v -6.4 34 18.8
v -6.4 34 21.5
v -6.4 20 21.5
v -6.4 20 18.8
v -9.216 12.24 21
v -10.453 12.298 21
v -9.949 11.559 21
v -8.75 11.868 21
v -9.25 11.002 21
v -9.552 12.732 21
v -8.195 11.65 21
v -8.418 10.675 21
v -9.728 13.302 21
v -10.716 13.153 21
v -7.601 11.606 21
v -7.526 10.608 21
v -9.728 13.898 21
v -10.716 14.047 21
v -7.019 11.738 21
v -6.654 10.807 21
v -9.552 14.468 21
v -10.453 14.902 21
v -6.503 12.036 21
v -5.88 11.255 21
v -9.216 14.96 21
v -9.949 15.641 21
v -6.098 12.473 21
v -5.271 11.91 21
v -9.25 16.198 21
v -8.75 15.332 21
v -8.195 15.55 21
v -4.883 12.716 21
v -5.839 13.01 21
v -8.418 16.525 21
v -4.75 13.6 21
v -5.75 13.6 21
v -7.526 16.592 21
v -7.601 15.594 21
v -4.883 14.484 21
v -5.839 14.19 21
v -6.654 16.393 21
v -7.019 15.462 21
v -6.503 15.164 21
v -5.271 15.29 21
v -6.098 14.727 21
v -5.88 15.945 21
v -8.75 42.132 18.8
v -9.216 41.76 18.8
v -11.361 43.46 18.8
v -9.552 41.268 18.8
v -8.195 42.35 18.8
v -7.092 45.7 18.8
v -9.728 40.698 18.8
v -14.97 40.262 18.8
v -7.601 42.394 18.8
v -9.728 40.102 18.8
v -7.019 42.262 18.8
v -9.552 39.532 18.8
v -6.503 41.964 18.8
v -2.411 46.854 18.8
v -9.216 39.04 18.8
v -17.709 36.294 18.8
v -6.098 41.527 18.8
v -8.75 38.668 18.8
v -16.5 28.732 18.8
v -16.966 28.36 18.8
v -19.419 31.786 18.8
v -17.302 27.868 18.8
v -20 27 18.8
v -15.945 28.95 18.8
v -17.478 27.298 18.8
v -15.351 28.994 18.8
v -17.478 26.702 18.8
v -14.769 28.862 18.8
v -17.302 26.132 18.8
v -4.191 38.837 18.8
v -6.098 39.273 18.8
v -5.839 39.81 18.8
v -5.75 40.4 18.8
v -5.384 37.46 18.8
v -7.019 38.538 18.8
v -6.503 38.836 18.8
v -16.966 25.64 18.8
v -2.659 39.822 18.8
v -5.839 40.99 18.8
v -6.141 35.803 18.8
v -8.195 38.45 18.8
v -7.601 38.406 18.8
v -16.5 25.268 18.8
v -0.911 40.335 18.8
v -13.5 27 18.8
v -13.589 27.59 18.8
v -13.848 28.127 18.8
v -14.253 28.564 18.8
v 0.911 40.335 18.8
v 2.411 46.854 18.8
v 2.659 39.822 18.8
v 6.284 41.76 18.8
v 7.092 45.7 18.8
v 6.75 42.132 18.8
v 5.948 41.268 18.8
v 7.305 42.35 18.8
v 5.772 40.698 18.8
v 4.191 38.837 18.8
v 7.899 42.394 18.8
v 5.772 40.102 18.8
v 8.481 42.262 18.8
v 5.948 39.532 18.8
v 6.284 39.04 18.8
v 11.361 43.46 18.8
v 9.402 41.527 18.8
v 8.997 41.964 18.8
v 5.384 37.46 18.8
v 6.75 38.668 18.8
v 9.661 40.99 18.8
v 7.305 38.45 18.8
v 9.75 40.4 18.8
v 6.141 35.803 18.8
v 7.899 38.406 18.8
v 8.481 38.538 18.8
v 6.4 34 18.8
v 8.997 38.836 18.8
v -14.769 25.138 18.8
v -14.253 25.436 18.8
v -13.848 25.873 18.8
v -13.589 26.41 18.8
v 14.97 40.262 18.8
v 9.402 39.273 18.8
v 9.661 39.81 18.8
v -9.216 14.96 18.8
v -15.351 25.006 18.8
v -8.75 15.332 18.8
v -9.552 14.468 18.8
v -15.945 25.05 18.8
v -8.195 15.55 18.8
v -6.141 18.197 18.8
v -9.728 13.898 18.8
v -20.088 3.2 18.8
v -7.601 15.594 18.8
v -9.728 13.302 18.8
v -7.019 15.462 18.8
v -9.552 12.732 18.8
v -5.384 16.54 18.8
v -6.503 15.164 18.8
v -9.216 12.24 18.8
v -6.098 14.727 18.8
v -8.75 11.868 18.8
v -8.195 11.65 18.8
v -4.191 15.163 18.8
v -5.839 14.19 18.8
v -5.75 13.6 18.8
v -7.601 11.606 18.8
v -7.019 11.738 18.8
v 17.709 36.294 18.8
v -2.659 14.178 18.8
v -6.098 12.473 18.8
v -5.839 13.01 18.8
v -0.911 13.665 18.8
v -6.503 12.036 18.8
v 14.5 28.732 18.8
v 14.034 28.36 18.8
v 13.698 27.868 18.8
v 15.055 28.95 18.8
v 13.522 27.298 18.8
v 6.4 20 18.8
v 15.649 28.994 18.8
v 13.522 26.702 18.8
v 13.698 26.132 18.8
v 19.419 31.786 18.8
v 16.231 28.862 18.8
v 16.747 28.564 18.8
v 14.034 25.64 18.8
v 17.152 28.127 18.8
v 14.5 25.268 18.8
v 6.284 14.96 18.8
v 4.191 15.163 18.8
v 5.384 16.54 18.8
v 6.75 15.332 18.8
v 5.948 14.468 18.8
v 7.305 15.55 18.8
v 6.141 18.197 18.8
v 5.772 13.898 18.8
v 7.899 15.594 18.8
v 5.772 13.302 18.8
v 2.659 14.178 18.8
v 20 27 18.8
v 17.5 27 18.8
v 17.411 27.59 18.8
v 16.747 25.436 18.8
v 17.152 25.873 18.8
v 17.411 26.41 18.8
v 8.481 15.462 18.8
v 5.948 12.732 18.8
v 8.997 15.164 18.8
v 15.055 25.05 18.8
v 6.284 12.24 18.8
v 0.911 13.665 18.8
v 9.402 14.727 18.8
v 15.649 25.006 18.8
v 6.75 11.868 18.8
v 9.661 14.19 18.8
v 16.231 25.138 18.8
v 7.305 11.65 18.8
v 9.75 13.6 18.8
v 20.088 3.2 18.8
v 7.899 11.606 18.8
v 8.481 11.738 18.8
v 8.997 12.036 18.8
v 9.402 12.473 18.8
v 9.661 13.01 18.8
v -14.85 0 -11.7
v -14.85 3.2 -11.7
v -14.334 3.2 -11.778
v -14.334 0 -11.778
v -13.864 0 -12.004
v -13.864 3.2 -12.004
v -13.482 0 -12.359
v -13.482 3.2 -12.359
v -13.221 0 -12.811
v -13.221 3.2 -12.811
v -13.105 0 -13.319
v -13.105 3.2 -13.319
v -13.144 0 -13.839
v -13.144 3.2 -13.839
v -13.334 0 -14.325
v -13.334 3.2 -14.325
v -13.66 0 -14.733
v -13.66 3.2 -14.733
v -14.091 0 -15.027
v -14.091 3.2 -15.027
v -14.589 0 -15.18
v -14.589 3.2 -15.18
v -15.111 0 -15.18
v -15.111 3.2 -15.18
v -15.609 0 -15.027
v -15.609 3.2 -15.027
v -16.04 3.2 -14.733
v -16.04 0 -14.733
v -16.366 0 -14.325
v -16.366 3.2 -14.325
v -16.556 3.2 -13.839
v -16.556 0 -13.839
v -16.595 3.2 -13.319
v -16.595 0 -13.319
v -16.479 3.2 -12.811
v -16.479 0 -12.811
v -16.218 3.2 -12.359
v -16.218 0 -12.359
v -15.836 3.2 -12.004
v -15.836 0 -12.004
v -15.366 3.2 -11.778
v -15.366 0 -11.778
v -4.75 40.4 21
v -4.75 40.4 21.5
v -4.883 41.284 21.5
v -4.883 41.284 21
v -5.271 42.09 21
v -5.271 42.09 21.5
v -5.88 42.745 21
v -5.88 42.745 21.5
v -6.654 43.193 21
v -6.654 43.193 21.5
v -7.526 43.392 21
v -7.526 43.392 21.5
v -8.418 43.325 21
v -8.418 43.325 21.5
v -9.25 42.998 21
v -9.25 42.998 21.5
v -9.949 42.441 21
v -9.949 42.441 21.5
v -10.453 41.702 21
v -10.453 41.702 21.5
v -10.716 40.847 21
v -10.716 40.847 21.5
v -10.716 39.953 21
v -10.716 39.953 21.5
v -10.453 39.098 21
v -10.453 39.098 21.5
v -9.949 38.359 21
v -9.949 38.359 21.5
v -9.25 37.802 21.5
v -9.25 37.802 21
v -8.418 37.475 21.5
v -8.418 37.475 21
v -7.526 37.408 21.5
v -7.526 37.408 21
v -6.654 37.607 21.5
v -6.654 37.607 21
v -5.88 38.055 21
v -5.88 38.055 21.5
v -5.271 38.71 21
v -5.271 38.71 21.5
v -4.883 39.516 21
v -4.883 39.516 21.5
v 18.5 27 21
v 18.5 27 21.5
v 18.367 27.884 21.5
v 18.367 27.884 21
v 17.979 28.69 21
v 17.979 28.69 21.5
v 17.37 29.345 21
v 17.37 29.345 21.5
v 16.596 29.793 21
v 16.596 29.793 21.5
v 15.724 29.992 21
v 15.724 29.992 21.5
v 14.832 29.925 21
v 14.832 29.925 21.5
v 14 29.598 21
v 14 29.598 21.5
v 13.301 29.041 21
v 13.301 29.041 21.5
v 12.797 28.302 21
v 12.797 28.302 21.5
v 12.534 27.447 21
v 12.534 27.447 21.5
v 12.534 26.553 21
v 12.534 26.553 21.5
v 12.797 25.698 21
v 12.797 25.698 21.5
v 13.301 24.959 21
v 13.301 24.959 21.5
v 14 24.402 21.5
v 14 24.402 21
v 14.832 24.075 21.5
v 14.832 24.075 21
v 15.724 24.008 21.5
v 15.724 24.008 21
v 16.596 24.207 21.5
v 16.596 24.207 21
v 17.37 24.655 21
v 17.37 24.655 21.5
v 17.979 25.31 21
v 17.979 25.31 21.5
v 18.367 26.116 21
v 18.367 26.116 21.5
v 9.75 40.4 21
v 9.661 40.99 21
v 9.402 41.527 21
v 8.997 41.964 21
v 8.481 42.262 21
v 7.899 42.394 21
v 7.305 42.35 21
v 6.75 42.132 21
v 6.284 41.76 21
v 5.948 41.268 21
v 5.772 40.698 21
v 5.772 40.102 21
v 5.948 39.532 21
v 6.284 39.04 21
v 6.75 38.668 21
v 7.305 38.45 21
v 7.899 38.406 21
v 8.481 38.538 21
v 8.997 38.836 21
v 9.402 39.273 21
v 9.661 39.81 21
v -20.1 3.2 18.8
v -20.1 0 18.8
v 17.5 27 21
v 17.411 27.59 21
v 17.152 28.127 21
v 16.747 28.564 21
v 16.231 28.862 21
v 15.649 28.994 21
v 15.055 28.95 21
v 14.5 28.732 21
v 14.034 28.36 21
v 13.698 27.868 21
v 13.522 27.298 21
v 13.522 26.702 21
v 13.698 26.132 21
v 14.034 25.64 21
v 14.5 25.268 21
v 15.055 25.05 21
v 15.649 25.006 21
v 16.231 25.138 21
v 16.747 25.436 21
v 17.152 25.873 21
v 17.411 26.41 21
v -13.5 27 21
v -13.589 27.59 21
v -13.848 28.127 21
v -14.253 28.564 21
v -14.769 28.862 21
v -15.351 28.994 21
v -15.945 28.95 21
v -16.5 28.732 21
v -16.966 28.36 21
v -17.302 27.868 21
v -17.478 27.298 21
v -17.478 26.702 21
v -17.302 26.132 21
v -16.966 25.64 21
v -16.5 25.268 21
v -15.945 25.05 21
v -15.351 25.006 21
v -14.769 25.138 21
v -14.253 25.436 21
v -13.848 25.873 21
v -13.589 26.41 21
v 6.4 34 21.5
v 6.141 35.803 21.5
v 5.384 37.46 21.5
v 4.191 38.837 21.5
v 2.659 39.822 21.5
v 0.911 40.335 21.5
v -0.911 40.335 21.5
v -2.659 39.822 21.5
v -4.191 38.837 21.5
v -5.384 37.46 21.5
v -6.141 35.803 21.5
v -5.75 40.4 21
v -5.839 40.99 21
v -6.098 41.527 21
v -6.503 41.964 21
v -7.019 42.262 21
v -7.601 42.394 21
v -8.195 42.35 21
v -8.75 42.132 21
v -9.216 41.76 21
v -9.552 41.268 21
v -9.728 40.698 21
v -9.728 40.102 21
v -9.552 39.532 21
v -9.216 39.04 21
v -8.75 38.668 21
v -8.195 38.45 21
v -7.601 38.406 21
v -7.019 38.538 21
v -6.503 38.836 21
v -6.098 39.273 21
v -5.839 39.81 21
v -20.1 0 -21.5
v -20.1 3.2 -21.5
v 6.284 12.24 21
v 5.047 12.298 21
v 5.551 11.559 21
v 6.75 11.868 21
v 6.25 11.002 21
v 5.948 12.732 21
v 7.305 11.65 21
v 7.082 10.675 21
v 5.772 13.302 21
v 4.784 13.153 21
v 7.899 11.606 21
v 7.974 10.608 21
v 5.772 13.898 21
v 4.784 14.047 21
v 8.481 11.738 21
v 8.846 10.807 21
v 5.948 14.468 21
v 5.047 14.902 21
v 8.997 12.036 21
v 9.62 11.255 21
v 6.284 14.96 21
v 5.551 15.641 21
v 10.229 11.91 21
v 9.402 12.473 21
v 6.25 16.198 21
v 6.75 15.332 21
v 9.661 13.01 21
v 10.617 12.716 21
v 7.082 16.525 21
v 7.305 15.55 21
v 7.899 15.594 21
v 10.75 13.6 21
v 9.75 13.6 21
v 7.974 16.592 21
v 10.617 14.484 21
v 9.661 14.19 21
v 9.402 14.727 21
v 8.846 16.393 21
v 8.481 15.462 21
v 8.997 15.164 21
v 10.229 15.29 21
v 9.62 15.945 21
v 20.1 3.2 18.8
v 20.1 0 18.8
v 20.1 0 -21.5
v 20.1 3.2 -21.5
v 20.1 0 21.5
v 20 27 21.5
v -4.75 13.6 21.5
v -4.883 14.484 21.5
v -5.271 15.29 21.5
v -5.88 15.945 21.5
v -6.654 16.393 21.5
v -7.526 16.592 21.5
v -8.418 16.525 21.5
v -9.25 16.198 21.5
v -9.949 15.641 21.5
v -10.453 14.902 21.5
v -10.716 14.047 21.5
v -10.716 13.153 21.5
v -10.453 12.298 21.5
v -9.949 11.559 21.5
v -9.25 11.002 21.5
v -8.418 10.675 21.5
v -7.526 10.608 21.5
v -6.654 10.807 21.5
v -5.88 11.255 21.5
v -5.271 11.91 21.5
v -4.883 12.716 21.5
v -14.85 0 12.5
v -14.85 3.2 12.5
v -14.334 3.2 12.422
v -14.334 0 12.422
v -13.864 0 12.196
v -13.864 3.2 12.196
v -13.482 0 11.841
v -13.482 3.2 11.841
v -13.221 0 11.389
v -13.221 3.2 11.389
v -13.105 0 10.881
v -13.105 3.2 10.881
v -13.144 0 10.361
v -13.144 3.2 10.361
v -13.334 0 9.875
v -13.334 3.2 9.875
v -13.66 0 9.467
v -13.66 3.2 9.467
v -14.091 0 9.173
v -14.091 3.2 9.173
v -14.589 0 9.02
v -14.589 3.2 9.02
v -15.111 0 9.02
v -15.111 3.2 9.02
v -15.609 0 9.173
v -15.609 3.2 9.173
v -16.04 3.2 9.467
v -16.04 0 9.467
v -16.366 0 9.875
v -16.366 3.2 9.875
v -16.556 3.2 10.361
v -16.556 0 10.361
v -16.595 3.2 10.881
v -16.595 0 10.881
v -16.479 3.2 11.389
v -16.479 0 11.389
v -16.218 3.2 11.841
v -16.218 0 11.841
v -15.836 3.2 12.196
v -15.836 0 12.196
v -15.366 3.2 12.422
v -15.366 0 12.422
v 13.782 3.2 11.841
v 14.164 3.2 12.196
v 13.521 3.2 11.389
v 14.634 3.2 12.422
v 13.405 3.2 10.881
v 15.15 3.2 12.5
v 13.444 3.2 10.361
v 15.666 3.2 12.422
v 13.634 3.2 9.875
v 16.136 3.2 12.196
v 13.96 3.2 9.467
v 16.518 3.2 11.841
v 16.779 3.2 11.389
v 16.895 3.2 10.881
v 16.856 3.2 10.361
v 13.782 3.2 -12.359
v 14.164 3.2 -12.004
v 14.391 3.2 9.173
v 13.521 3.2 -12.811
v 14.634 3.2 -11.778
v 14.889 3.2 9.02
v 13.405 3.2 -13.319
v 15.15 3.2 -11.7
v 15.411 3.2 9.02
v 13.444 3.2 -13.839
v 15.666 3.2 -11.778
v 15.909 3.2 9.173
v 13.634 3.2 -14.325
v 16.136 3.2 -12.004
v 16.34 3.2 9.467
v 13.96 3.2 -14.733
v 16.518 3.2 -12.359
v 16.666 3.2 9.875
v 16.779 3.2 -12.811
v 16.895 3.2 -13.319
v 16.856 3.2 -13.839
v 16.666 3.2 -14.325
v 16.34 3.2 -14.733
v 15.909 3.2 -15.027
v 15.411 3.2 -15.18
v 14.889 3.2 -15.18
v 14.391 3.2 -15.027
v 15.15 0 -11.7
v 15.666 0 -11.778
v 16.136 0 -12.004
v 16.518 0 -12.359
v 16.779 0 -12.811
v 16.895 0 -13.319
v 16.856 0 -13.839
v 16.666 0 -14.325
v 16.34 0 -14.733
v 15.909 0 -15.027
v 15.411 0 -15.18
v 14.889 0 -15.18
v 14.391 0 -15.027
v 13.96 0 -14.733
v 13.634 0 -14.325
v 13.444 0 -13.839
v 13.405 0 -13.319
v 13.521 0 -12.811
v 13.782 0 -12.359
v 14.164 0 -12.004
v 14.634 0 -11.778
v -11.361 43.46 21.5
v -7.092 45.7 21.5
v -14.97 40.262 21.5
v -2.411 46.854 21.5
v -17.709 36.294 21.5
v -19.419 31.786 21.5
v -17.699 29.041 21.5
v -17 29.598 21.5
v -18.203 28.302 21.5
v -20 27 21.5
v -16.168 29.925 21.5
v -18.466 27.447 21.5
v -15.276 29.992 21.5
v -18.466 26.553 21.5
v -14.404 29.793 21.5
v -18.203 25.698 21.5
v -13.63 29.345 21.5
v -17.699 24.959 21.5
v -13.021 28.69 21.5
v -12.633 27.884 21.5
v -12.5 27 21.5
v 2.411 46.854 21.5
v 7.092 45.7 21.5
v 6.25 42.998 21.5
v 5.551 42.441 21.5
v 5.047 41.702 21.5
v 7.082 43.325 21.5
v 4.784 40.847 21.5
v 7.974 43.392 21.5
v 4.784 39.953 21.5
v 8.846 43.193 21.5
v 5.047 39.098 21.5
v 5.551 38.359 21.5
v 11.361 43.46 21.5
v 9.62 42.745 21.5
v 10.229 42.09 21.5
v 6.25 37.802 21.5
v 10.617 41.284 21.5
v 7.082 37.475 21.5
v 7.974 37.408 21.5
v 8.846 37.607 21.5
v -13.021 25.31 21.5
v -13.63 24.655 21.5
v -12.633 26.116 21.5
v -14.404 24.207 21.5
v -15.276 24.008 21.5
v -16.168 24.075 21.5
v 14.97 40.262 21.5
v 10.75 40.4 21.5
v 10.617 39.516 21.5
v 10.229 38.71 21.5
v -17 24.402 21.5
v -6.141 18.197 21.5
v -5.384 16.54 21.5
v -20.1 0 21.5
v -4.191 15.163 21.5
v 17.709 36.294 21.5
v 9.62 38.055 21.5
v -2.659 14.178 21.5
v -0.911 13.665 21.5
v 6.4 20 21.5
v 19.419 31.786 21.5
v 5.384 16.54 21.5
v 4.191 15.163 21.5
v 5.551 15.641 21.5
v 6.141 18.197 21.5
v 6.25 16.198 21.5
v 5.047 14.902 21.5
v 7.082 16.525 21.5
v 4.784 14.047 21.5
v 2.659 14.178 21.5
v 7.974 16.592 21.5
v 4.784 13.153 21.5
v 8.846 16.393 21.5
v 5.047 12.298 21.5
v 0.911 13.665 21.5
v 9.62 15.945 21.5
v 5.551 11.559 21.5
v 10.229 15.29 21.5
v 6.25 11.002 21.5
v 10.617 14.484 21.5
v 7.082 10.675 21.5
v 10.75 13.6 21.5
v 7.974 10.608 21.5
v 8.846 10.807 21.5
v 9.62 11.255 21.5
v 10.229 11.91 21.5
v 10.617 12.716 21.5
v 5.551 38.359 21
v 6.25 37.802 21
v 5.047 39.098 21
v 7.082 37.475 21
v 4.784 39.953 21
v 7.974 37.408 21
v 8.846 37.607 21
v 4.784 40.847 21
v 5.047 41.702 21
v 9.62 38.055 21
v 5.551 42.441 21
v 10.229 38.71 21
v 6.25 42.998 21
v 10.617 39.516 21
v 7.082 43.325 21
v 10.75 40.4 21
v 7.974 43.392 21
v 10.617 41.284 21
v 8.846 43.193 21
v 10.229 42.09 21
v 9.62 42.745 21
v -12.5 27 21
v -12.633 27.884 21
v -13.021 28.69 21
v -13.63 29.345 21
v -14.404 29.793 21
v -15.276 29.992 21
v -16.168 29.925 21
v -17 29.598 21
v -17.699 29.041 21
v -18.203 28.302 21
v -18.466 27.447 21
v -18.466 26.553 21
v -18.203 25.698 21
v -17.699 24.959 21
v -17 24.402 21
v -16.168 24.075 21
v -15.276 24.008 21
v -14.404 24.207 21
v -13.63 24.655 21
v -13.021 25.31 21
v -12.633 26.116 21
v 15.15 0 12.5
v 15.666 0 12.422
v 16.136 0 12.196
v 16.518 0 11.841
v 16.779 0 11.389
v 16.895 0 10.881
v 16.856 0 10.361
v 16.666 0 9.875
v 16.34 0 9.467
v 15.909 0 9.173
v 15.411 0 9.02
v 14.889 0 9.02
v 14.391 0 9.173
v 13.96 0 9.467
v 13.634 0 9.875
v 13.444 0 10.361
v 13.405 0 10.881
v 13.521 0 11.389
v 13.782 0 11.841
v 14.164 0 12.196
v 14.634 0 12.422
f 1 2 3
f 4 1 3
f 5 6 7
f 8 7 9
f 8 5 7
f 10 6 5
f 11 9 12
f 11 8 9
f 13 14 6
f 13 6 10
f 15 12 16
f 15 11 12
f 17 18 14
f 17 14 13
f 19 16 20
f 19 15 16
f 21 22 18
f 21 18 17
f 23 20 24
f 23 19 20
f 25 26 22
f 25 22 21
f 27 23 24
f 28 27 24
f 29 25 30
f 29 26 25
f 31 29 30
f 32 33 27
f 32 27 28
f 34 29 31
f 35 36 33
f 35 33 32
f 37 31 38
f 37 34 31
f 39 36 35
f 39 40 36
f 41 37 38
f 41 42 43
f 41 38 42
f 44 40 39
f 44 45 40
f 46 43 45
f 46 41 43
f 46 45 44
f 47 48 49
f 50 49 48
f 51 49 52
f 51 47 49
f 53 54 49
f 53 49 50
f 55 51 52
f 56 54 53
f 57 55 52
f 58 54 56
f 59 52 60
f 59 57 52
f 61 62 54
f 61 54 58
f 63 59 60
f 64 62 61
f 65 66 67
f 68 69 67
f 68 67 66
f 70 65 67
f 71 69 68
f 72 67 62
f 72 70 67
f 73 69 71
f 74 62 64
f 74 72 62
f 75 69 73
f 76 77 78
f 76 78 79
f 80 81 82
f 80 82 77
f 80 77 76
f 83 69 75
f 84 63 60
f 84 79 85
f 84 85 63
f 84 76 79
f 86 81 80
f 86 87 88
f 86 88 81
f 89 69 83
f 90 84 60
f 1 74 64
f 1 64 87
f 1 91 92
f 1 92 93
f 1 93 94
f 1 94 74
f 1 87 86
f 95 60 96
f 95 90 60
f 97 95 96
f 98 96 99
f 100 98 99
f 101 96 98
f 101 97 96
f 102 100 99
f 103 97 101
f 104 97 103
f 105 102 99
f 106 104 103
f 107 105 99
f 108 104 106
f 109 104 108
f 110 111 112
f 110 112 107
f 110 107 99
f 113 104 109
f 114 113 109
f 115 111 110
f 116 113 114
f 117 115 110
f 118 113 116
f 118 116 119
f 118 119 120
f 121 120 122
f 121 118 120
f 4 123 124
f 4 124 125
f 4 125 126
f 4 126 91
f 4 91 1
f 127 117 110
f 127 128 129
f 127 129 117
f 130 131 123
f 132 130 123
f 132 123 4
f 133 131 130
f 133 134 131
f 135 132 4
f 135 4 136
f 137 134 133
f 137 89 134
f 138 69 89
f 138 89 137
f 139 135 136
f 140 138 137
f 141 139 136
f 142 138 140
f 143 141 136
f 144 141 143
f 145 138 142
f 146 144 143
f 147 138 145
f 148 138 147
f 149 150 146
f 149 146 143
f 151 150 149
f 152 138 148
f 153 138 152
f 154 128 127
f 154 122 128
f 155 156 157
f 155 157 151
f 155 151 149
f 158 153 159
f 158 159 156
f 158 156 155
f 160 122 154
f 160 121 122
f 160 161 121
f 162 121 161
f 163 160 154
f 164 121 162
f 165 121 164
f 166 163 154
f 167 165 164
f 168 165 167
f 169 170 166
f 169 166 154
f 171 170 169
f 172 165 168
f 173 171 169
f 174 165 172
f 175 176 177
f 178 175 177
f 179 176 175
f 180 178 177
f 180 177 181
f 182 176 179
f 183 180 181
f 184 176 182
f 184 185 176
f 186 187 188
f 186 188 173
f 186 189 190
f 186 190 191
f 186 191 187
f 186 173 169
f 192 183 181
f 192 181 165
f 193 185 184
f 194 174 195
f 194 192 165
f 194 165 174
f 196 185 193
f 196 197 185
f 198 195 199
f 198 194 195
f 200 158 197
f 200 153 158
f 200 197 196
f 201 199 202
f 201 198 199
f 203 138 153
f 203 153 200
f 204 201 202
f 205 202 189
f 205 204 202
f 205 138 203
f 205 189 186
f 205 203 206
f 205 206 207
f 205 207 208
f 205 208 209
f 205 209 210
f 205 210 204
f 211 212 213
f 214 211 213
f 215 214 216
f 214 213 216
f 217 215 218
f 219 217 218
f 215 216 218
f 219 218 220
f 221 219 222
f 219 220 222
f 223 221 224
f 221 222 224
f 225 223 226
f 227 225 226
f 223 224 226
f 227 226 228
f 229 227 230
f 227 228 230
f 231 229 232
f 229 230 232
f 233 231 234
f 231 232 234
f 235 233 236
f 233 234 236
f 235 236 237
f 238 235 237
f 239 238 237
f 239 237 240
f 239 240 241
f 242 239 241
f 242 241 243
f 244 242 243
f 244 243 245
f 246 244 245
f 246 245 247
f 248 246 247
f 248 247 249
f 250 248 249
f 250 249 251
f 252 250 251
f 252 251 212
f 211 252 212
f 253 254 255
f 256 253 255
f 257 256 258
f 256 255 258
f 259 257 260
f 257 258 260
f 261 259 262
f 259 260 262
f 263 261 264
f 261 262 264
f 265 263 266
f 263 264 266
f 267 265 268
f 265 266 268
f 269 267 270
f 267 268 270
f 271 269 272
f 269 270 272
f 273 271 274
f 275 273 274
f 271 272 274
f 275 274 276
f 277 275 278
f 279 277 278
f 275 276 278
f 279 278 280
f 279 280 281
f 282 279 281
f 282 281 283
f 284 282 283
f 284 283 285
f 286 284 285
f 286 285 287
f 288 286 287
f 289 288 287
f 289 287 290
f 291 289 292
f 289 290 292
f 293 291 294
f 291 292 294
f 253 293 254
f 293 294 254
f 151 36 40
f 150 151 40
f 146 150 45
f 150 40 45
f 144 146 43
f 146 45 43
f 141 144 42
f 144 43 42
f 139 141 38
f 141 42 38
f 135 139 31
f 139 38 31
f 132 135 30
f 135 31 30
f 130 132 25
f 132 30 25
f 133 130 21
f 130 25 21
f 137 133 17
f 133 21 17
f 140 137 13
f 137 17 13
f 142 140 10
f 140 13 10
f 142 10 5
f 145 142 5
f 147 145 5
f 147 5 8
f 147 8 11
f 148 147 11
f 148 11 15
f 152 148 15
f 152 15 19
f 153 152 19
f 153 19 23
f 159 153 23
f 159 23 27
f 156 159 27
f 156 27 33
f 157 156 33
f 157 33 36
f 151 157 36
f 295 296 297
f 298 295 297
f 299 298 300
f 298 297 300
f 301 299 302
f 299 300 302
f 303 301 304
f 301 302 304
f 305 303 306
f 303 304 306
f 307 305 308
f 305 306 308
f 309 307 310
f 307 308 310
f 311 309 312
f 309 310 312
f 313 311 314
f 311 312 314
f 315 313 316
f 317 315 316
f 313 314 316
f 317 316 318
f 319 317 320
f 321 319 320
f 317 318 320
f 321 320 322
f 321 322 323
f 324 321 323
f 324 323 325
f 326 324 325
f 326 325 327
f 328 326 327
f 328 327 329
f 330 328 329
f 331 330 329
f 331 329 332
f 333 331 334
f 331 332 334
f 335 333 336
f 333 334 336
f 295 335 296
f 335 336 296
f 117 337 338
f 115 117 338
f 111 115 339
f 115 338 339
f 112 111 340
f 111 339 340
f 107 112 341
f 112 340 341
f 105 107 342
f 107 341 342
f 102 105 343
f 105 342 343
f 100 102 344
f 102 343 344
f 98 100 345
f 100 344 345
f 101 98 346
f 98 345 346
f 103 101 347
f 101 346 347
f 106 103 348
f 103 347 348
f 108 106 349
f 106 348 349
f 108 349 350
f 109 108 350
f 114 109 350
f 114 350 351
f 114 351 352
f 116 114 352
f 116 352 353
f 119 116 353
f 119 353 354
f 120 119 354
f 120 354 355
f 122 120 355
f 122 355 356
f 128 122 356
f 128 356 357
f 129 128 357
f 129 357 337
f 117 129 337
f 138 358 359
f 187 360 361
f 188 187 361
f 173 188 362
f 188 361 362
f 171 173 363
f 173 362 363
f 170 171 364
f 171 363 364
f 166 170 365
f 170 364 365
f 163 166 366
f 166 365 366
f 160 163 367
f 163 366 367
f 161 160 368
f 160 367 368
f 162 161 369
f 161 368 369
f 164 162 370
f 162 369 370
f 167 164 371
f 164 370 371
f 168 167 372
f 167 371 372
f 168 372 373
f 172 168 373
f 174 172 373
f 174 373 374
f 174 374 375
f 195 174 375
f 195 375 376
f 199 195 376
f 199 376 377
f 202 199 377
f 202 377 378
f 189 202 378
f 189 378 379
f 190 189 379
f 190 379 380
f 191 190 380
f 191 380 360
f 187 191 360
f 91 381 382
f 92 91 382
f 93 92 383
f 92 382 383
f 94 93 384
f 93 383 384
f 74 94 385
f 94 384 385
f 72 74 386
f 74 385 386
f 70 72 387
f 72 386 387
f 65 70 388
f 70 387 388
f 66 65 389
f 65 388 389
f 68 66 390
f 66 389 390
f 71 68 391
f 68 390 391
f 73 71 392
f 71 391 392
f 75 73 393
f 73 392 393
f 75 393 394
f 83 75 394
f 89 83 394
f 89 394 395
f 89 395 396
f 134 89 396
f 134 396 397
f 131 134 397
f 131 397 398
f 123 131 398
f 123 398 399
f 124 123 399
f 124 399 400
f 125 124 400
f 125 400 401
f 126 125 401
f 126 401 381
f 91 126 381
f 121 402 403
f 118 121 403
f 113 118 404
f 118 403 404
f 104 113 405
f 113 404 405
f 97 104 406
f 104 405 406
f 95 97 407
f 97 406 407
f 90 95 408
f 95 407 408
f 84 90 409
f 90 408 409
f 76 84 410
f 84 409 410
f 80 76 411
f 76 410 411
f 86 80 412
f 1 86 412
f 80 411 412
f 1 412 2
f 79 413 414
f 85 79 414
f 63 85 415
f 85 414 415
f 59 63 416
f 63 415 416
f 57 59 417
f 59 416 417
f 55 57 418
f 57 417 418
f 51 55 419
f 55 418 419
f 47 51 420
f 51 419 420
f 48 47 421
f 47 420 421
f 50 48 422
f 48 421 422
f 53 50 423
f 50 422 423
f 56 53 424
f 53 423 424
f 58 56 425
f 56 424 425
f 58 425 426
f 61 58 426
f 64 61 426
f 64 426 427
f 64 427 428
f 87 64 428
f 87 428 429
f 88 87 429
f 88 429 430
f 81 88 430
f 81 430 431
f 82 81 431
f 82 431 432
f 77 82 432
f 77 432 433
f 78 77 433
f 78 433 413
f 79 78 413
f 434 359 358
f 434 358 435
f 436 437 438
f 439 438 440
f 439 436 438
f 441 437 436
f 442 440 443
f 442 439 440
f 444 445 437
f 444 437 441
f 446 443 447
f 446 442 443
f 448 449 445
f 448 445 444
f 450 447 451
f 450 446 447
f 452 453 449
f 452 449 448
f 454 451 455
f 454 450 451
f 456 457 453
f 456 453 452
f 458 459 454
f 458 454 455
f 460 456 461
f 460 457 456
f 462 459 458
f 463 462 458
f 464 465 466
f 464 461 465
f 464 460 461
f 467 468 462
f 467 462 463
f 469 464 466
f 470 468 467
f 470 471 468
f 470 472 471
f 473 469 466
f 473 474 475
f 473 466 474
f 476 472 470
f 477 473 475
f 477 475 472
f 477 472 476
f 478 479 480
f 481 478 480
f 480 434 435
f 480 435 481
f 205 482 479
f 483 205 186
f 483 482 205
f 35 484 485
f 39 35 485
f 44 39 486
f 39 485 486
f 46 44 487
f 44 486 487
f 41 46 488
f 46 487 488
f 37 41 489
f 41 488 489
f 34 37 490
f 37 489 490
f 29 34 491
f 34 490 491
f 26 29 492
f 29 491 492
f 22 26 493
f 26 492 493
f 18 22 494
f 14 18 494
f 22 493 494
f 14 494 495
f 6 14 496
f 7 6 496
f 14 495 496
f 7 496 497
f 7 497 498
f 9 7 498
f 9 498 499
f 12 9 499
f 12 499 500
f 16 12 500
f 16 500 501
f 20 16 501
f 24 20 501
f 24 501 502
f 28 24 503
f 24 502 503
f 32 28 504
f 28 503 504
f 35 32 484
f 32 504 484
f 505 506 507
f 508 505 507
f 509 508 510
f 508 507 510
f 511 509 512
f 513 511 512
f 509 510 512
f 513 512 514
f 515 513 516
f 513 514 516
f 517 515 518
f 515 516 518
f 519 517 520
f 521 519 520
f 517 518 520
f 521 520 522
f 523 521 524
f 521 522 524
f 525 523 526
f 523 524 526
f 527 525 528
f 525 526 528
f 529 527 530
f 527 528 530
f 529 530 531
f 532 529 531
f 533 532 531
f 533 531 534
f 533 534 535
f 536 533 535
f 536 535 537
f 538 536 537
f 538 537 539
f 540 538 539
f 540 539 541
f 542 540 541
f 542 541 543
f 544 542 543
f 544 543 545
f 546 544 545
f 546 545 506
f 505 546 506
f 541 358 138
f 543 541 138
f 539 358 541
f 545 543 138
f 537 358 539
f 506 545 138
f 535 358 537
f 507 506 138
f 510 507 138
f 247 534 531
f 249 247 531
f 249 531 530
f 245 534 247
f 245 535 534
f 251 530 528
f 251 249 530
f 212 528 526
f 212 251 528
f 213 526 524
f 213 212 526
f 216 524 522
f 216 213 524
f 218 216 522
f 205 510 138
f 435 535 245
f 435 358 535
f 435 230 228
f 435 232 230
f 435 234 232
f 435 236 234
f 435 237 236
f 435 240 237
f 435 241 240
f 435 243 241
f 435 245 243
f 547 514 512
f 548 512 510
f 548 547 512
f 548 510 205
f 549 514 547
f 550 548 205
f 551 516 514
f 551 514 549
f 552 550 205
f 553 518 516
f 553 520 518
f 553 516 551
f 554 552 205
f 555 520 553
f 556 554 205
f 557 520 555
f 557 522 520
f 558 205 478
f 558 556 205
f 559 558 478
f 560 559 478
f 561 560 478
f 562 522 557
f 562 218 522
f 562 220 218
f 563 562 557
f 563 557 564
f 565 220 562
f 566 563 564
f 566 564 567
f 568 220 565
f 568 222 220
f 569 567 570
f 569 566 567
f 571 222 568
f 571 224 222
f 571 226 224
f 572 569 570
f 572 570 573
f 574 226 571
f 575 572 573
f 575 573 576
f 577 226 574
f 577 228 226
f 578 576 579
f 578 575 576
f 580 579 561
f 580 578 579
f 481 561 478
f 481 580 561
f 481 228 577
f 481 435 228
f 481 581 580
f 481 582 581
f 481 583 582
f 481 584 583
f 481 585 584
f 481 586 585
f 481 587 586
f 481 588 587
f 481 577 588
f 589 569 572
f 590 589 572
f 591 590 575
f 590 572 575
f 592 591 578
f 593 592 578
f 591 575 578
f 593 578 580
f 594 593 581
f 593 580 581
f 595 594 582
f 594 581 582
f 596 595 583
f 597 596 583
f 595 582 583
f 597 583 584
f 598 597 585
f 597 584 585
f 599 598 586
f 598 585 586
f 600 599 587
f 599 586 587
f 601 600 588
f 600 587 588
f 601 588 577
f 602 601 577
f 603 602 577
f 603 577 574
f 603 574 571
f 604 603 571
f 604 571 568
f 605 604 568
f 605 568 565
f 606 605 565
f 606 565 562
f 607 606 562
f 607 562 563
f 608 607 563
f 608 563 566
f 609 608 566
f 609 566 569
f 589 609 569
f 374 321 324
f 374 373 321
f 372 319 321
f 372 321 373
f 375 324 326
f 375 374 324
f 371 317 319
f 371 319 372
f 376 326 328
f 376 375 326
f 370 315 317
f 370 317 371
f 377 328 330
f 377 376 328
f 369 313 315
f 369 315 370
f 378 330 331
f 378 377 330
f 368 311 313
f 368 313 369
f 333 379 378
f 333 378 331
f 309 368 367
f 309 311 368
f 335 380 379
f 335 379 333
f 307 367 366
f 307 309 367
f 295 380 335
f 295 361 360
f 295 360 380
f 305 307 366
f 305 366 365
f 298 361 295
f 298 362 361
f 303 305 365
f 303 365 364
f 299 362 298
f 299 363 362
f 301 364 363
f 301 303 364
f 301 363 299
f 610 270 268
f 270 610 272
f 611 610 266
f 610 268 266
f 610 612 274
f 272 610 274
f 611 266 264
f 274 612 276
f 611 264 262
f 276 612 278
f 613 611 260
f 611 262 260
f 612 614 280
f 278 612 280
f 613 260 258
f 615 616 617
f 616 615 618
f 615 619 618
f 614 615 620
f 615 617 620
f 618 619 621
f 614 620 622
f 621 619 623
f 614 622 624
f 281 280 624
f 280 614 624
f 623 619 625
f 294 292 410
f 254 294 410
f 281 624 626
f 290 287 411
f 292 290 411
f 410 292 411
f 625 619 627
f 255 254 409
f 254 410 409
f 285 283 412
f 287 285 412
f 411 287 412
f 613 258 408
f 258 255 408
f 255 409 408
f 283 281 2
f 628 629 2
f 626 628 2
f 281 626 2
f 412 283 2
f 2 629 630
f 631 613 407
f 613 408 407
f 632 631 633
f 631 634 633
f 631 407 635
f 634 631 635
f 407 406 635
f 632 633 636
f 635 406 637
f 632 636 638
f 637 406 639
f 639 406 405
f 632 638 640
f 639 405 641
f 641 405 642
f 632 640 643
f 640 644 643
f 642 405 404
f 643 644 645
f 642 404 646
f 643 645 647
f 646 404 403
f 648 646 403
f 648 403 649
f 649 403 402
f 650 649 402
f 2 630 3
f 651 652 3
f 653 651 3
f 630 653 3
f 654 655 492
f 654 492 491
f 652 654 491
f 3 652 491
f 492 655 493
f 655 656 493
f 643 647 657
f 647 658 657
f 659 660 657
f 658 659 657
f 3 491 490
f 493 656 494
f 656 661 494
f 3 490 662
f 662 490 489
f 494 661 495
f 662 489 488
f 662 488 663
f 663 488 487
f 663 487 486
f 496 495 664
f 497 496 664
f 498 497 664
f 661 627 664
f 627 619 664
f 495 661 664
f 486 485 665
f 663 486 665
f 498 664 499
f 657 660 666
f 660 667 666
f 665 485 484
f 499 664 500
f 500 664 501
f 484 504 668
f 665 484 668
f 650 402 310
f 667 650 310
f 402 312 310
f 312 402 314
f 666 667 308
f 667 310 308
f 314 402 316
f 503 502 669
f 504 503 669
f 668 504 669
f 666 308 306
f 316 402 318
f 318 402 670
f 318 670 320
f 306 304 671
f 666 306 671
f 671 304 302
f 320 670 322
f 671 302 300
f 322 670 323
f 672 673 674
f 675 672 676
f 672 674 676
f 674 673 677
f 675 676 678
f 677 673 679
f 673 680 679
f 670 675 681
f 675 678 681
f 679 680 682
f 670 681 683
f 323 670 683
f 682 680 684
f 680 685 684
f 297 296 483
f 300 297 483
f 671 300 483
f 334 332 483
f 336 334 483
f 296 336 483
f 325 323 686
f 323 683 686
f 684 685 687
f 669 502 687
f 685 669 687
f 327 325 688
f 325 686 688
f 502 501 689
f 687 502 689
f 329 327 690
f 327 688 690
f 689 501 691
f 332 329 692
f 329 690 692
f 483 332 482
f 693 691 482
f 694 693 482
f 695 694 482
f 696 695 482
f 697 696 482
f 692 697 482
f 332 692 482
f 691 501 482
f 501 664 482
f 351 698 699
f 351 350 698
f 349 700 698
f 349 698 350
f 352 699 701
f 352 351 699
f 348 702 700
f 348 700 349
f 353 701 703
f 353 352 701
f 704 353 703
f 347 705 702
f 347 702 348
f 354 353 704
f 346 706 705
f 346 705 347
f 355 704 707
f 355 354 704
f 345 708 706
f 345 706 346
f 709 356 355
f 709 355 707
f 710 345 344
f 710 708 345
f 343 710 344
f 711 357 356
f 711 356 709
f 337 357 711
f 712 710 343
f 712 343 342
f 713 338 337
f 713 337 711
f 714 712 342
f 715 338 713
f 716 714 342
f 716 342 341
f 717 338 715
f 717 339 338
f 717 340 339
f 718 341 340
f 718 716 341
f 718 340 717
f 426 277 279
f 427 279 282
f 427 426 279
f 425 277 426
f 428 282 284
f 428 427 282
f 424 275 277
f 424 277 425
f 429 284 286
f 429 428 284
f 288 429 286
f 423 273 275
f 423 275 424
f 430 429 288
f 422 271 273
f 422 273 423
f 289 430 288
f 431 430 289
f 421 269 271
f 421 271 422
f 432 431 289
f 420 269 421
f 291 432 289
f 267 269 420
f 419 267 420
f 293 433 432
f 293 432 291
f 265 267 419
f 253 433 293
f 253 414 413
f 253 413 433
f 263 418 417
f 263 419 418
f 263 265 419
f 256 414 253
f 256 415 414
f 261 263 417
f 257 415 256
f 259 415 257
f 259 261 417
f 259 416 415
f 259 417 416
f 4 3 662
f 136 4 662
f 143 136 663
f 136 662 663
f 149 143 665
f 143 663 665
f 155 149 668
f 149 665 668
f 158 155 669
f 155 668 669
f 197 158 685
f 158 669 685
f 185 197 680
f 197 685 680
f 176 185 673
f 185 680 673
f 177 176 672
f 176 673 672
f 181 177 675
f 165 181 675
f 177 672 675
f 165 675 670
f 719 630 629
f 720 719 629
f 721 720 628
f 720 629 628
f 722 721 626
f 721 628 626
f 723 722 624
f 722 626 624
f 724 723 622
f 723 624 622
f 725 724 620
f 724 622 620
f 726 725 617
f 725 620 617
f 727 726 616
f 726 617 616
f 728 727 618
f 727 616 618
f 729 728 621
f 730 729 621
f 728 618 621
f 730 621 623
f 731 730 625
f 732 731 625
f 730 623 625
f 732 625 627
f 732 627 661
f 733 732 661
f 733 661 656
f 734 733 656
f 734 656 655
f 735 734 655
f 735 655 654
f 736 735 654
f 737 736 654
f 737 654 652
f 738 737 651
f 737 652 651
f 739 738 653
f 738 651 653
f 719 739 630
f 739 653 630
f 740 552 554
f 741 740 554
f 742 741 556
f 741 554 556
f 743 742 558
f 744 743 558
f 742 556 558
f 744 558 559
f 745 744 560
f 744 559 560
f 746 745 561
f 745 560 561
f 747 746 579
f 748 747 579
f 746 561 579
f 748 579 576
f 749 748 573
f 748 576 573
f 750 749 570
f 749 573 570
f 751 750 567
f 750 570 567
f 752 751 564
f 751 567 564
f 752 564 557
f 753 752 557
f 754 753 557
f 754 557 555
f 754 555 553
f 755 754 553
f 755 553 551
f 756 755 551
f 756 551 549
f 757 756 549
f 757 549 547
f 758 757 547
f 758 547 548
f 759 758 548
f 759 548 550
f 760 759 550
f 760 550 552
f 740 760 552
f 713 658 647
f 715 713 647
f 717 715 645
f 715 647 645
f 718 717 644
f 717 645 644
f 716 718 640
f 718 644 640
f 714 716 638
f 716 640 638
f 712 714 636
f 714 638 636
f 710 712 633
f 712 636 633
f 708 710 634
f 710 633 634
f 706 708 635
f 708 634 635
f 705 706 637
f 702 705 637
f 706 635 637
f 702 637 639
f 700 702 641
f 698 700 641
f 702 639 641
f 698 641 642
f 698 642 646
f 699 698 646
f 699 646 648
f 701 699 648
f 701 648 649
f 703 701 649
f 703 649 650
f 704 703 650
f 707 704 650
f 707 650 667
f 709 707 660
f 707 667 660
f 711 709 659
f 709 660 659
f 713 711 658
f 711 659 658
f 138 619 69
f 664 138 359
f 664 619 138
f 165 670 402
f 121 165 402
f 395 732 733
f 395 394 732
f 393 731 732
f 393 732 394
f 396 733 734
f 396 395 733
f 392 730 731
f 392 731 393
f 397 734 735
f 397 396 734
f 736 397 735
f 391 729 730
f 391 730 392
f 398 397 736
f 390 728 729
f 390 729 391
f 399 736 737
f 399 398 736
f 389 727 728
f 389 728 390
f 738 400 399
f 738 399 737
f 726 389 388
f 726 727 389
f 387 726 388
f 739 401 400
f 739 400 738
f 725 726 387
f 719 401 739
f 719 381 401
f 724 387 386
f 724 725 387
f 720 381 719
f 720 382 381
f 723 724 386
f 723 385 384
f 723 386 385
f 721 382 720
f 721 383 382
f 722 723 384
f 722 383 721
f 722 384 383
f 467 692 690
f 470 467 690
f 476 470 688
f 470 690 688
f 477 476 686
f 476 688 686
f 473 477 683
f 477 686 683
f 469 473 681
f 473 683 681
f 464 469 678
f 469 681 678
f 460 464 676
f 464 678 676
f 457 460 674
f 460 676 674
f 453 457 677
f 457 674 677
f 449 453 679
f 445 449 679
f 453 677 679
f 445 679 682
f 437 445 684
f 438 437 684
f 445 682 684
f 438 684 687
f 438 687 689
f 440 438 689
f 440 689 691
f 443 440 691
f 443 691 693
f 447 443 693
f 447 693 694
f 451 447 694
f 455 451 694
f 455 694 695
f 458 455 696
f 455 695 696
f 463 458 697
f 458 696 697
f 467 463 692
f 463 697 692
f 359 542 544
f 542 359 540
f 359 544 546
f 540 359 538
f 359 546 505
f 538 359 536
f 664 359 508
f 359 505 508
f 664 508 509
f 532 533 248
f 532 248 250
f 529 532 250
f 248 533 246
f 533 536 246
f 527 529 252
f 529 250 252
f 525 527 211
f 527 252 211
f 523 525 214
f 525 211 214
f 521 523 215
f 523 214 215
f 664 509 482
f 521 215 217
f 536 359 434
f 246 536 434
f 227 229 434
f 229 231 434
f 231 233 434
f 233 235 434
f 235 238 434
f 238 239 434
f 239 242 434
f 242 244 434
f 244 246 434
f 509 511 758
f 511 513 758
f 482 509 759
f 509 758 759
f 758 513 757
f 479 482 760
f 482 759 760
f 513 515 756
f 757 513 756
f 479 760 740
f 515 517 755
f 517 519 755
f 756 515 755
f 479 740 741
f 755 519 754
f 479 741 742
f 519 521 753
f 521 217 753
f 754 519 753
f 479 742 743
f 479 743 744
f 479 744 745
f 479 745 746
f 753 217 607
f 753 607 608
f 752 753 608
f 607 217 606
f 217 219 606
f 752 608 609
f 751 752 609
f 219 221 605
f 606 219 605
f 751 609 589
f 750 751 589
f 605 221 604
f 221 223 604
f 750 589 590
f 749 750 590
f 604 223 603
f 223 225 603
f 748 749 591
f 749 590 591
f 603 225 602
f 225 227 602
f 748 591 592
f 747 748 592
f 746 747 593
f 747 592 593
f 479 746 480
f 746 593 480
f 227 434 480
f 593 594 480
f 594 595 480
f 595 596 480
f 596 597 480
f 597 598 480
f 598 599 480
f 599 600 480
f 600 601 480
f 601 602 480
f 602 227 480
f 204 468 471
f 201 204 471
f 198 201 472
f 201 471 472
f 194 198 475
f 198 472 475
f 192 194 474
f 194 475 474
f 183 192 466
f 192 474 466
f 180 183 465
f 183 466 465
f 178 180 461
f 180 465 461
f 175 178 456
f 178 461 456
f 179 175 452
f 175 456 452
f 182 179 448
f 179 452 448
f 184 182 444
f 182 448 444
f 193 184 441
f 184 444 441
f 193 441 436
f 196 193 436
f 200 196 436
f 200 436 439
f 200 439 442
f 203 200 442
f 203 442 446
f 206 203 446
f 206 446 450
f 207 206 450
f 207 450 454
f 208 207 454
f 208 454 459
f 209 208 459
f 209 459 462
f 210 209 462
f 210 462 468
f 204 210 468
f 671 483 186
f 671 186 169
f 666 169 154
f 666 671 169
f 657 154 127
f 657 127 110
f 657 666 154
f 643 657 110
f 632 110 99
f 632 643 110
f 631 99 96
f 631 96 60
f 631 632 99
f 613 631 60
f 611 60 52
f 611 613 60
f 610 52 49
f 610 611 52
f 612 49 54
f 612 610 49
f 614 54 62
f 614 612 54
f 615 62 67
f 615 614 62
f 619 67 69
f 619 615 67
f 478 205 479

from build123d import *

# Parameters (mm, degrees)
SKETCH_1_W          = 40.2
SKETCH_1_H          = 43
EXTRUDE_1_DEPTH     = 3.2
SKETCH_3_W          = 40.2
SKETCH_3_H          = 2.7
EXTRUDE_3_DEPTH     = 43.8
SKETCH_4_OUTSIDE_W  = 57.266
SKETCH_4_OUTSIDE_H  = 64.066
CUT_EXTRUDE_2_DEPTH = 2.7
SKETCH_5_R          = 1.75
CUT_EXTRUDE_3_DEPTH = 53.770256774
CUT_EXTRUDE_4_DEPTH = 3.2
SKETCH_7_R          = 2
CUT_EXTRUDE_5_DEPTH = 3.2
SKETCH_8_R          = 3
CUT_EXTRUDE_6_DEPTH = 0.5


with BuildPart() as part:
    # 草图1 → 凸台-拉伸1 (new body)
    with BuildSketch(Plane(origin=(0, 0, 0), x_dir=(1, 0, 0), z_dir=(0, 1, 0))):
        Rectangle(SKETCH_1_W, SKETCH_1_H)
    extrude(amount=EXTRUDE_1_DEPTH)

    # 草图3 → 凸台-拉伸3 (add)
    with BuildSketch(Plane(origin=(0, 3.2, 0), x_dir=(1, 0, 0), z_dir=(0, 1, 0))):
        with Locations((0, -20.15)):
            Rectangle(SKETCH_3_W, SKETCH_3_H)
    extrude(amount=EXTRUDE_3_DEPTH)

    # 草图4 outside → 切除-拉伸2 (cut)
    with BuildSketch(Plane.XY.offset(21.5)):
        with Locations((0, 23.5)):
            Rectangle(SKETCH_4_OUTSIDE_W, SKETCH_4_OUTSIDE_H)
        with BuildLine():
            Line((-20, 27), (-20.1, 0))
            Line((-20.1, 0), (20.1, 0))
            Line((20.1, 0), (20, 27))
            ThreePointArc((20, 27), (0, 47), (-20, 27))
        make_face(mode=Mode.SUBTRACT)
    extrude(amount=-CUT_EXTRUDE_2_DEPTH, mode=Mode.SUBTRACT)

    # 草图5 → 切除-拉伸3 (cut, through all)
    with BuildSketch(Plane(origin=(0, 3.2, 0), x_dir=(1, 0, 0), z_dir=(0, 1, 0))):
        with Locations(Location((-14.85, 13.45, 0), (0, 0, 270))):
            Circle(SKETCH_5_R)
        with Locations(Location((15.15, -10.75, 0), (0, 0, 270))):
            Circle(SKETCH_5_R)
        with Locations(Location((-14.85, -10.75, 0), (0, 0, 270))):
            Circle(SKETCH_5_R)
        with Locations(Location((15.15, 13.45, 0), (0, 0, 270))):
            Circle(SKETCH_5_R)
    extrude(amount=-CUT_EXTRUDE_3_DEPTH, mode=Mode.SUBTRACT)

    # 草图6 → 切除-拉伸4 (cut)
    with BuildSketch(Plane.XY.offset(21.5)):
        with BuildLine():
            Line((-6.4, 34), (-6.4, 20))
            ThreePointArc((-6.4, 20), (0, 13.6), (6.4, 20))
            Line((6.4, 20), (6.4, 34))
            ThreePointArc((6.4, 34), (0, 40.4), (-6.4, 34))
        make_face()
    extrude(amount=-CUT_EXTRUDE_4_DEPTH, mode=Mode.SUBTRACT)

    # 草图7 → 切除-拉伸5 (cut)
    with BuildSketch(Plane.XY.offset(21.5)):
        with Locations((-7.75, 40.4)):
            Circle(SKETCH_7_R)
        with Locations((7.75, 40.4)):
            Circle(SKETCH_7_R)
        with Locations((-15.5, 27)):
            Circle(SKETCH_7_R)
        with Locations((15.5, 27)):
            Circle(SKETCH_7_R)
        with Locations((-7.75, 13.6)):
            Circle(SKETCH_7_R)
        with Locations((7.75, 13.6)):
            Circle(SKETCH_7_R)
    extrude(amount=-CUT_EXTRUDE_5_DEPTH, mode=Mode.SUBTRACT)

    # 草图8 → 切除-拉伸6 (cut)
    with BuildSketch(Plane.XY.offset(21.5)):
        with Locations((-7.75, 40.4)):
            Circle(SKETCH_8_R)
        with Locations((7.75, 40.4)):
            Circle(SKETCH_8_R)
        with Locations((-15.5, 27)):
            Circle(SKETCH_8_R)
        with Locations((15.5, 27)):
            Circle(SKETCH_8_R)
        with Locations((-7.75, 13.6)):
            Circle(SKETCH_8_R)
        with Locations((7.75, 13.6)):
            Circle(SKETCH_8_R)
    extrude(amount=-CUT_EXTRUDE_6_DEPTH, mode=Mode.SUBTRACT)


solid = part.part
